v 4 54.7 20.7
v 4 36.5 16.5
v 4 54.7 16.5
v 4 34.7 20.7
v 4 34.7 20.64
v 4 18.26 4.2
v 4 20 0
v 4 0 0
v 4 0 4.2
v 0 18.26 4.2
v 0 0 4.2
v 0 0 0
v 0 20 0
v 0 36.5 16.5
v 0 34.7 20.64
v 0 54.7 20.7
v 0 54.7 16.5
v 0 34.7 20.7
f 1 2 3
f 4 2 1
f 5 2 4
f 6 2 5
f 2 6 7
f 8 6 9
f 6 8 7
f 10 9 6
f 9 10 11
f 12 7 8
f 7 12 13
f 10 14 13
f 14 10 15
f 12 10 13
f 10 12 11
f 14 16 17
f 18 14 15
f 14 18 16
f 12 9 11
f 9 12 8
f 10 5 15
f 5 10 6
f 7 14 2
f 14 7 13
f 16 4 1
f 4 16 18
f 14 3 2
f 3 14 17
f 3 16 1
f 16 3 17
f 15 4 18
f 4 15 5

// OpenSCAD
$fa=1;


cube([4,20,4.2]);
translate([0,20,0])
    rotate([45,0,0])
        cube([4,25,4.2]);
translate([0,34.7,16.5])
    cube([4,20,4.2]);
